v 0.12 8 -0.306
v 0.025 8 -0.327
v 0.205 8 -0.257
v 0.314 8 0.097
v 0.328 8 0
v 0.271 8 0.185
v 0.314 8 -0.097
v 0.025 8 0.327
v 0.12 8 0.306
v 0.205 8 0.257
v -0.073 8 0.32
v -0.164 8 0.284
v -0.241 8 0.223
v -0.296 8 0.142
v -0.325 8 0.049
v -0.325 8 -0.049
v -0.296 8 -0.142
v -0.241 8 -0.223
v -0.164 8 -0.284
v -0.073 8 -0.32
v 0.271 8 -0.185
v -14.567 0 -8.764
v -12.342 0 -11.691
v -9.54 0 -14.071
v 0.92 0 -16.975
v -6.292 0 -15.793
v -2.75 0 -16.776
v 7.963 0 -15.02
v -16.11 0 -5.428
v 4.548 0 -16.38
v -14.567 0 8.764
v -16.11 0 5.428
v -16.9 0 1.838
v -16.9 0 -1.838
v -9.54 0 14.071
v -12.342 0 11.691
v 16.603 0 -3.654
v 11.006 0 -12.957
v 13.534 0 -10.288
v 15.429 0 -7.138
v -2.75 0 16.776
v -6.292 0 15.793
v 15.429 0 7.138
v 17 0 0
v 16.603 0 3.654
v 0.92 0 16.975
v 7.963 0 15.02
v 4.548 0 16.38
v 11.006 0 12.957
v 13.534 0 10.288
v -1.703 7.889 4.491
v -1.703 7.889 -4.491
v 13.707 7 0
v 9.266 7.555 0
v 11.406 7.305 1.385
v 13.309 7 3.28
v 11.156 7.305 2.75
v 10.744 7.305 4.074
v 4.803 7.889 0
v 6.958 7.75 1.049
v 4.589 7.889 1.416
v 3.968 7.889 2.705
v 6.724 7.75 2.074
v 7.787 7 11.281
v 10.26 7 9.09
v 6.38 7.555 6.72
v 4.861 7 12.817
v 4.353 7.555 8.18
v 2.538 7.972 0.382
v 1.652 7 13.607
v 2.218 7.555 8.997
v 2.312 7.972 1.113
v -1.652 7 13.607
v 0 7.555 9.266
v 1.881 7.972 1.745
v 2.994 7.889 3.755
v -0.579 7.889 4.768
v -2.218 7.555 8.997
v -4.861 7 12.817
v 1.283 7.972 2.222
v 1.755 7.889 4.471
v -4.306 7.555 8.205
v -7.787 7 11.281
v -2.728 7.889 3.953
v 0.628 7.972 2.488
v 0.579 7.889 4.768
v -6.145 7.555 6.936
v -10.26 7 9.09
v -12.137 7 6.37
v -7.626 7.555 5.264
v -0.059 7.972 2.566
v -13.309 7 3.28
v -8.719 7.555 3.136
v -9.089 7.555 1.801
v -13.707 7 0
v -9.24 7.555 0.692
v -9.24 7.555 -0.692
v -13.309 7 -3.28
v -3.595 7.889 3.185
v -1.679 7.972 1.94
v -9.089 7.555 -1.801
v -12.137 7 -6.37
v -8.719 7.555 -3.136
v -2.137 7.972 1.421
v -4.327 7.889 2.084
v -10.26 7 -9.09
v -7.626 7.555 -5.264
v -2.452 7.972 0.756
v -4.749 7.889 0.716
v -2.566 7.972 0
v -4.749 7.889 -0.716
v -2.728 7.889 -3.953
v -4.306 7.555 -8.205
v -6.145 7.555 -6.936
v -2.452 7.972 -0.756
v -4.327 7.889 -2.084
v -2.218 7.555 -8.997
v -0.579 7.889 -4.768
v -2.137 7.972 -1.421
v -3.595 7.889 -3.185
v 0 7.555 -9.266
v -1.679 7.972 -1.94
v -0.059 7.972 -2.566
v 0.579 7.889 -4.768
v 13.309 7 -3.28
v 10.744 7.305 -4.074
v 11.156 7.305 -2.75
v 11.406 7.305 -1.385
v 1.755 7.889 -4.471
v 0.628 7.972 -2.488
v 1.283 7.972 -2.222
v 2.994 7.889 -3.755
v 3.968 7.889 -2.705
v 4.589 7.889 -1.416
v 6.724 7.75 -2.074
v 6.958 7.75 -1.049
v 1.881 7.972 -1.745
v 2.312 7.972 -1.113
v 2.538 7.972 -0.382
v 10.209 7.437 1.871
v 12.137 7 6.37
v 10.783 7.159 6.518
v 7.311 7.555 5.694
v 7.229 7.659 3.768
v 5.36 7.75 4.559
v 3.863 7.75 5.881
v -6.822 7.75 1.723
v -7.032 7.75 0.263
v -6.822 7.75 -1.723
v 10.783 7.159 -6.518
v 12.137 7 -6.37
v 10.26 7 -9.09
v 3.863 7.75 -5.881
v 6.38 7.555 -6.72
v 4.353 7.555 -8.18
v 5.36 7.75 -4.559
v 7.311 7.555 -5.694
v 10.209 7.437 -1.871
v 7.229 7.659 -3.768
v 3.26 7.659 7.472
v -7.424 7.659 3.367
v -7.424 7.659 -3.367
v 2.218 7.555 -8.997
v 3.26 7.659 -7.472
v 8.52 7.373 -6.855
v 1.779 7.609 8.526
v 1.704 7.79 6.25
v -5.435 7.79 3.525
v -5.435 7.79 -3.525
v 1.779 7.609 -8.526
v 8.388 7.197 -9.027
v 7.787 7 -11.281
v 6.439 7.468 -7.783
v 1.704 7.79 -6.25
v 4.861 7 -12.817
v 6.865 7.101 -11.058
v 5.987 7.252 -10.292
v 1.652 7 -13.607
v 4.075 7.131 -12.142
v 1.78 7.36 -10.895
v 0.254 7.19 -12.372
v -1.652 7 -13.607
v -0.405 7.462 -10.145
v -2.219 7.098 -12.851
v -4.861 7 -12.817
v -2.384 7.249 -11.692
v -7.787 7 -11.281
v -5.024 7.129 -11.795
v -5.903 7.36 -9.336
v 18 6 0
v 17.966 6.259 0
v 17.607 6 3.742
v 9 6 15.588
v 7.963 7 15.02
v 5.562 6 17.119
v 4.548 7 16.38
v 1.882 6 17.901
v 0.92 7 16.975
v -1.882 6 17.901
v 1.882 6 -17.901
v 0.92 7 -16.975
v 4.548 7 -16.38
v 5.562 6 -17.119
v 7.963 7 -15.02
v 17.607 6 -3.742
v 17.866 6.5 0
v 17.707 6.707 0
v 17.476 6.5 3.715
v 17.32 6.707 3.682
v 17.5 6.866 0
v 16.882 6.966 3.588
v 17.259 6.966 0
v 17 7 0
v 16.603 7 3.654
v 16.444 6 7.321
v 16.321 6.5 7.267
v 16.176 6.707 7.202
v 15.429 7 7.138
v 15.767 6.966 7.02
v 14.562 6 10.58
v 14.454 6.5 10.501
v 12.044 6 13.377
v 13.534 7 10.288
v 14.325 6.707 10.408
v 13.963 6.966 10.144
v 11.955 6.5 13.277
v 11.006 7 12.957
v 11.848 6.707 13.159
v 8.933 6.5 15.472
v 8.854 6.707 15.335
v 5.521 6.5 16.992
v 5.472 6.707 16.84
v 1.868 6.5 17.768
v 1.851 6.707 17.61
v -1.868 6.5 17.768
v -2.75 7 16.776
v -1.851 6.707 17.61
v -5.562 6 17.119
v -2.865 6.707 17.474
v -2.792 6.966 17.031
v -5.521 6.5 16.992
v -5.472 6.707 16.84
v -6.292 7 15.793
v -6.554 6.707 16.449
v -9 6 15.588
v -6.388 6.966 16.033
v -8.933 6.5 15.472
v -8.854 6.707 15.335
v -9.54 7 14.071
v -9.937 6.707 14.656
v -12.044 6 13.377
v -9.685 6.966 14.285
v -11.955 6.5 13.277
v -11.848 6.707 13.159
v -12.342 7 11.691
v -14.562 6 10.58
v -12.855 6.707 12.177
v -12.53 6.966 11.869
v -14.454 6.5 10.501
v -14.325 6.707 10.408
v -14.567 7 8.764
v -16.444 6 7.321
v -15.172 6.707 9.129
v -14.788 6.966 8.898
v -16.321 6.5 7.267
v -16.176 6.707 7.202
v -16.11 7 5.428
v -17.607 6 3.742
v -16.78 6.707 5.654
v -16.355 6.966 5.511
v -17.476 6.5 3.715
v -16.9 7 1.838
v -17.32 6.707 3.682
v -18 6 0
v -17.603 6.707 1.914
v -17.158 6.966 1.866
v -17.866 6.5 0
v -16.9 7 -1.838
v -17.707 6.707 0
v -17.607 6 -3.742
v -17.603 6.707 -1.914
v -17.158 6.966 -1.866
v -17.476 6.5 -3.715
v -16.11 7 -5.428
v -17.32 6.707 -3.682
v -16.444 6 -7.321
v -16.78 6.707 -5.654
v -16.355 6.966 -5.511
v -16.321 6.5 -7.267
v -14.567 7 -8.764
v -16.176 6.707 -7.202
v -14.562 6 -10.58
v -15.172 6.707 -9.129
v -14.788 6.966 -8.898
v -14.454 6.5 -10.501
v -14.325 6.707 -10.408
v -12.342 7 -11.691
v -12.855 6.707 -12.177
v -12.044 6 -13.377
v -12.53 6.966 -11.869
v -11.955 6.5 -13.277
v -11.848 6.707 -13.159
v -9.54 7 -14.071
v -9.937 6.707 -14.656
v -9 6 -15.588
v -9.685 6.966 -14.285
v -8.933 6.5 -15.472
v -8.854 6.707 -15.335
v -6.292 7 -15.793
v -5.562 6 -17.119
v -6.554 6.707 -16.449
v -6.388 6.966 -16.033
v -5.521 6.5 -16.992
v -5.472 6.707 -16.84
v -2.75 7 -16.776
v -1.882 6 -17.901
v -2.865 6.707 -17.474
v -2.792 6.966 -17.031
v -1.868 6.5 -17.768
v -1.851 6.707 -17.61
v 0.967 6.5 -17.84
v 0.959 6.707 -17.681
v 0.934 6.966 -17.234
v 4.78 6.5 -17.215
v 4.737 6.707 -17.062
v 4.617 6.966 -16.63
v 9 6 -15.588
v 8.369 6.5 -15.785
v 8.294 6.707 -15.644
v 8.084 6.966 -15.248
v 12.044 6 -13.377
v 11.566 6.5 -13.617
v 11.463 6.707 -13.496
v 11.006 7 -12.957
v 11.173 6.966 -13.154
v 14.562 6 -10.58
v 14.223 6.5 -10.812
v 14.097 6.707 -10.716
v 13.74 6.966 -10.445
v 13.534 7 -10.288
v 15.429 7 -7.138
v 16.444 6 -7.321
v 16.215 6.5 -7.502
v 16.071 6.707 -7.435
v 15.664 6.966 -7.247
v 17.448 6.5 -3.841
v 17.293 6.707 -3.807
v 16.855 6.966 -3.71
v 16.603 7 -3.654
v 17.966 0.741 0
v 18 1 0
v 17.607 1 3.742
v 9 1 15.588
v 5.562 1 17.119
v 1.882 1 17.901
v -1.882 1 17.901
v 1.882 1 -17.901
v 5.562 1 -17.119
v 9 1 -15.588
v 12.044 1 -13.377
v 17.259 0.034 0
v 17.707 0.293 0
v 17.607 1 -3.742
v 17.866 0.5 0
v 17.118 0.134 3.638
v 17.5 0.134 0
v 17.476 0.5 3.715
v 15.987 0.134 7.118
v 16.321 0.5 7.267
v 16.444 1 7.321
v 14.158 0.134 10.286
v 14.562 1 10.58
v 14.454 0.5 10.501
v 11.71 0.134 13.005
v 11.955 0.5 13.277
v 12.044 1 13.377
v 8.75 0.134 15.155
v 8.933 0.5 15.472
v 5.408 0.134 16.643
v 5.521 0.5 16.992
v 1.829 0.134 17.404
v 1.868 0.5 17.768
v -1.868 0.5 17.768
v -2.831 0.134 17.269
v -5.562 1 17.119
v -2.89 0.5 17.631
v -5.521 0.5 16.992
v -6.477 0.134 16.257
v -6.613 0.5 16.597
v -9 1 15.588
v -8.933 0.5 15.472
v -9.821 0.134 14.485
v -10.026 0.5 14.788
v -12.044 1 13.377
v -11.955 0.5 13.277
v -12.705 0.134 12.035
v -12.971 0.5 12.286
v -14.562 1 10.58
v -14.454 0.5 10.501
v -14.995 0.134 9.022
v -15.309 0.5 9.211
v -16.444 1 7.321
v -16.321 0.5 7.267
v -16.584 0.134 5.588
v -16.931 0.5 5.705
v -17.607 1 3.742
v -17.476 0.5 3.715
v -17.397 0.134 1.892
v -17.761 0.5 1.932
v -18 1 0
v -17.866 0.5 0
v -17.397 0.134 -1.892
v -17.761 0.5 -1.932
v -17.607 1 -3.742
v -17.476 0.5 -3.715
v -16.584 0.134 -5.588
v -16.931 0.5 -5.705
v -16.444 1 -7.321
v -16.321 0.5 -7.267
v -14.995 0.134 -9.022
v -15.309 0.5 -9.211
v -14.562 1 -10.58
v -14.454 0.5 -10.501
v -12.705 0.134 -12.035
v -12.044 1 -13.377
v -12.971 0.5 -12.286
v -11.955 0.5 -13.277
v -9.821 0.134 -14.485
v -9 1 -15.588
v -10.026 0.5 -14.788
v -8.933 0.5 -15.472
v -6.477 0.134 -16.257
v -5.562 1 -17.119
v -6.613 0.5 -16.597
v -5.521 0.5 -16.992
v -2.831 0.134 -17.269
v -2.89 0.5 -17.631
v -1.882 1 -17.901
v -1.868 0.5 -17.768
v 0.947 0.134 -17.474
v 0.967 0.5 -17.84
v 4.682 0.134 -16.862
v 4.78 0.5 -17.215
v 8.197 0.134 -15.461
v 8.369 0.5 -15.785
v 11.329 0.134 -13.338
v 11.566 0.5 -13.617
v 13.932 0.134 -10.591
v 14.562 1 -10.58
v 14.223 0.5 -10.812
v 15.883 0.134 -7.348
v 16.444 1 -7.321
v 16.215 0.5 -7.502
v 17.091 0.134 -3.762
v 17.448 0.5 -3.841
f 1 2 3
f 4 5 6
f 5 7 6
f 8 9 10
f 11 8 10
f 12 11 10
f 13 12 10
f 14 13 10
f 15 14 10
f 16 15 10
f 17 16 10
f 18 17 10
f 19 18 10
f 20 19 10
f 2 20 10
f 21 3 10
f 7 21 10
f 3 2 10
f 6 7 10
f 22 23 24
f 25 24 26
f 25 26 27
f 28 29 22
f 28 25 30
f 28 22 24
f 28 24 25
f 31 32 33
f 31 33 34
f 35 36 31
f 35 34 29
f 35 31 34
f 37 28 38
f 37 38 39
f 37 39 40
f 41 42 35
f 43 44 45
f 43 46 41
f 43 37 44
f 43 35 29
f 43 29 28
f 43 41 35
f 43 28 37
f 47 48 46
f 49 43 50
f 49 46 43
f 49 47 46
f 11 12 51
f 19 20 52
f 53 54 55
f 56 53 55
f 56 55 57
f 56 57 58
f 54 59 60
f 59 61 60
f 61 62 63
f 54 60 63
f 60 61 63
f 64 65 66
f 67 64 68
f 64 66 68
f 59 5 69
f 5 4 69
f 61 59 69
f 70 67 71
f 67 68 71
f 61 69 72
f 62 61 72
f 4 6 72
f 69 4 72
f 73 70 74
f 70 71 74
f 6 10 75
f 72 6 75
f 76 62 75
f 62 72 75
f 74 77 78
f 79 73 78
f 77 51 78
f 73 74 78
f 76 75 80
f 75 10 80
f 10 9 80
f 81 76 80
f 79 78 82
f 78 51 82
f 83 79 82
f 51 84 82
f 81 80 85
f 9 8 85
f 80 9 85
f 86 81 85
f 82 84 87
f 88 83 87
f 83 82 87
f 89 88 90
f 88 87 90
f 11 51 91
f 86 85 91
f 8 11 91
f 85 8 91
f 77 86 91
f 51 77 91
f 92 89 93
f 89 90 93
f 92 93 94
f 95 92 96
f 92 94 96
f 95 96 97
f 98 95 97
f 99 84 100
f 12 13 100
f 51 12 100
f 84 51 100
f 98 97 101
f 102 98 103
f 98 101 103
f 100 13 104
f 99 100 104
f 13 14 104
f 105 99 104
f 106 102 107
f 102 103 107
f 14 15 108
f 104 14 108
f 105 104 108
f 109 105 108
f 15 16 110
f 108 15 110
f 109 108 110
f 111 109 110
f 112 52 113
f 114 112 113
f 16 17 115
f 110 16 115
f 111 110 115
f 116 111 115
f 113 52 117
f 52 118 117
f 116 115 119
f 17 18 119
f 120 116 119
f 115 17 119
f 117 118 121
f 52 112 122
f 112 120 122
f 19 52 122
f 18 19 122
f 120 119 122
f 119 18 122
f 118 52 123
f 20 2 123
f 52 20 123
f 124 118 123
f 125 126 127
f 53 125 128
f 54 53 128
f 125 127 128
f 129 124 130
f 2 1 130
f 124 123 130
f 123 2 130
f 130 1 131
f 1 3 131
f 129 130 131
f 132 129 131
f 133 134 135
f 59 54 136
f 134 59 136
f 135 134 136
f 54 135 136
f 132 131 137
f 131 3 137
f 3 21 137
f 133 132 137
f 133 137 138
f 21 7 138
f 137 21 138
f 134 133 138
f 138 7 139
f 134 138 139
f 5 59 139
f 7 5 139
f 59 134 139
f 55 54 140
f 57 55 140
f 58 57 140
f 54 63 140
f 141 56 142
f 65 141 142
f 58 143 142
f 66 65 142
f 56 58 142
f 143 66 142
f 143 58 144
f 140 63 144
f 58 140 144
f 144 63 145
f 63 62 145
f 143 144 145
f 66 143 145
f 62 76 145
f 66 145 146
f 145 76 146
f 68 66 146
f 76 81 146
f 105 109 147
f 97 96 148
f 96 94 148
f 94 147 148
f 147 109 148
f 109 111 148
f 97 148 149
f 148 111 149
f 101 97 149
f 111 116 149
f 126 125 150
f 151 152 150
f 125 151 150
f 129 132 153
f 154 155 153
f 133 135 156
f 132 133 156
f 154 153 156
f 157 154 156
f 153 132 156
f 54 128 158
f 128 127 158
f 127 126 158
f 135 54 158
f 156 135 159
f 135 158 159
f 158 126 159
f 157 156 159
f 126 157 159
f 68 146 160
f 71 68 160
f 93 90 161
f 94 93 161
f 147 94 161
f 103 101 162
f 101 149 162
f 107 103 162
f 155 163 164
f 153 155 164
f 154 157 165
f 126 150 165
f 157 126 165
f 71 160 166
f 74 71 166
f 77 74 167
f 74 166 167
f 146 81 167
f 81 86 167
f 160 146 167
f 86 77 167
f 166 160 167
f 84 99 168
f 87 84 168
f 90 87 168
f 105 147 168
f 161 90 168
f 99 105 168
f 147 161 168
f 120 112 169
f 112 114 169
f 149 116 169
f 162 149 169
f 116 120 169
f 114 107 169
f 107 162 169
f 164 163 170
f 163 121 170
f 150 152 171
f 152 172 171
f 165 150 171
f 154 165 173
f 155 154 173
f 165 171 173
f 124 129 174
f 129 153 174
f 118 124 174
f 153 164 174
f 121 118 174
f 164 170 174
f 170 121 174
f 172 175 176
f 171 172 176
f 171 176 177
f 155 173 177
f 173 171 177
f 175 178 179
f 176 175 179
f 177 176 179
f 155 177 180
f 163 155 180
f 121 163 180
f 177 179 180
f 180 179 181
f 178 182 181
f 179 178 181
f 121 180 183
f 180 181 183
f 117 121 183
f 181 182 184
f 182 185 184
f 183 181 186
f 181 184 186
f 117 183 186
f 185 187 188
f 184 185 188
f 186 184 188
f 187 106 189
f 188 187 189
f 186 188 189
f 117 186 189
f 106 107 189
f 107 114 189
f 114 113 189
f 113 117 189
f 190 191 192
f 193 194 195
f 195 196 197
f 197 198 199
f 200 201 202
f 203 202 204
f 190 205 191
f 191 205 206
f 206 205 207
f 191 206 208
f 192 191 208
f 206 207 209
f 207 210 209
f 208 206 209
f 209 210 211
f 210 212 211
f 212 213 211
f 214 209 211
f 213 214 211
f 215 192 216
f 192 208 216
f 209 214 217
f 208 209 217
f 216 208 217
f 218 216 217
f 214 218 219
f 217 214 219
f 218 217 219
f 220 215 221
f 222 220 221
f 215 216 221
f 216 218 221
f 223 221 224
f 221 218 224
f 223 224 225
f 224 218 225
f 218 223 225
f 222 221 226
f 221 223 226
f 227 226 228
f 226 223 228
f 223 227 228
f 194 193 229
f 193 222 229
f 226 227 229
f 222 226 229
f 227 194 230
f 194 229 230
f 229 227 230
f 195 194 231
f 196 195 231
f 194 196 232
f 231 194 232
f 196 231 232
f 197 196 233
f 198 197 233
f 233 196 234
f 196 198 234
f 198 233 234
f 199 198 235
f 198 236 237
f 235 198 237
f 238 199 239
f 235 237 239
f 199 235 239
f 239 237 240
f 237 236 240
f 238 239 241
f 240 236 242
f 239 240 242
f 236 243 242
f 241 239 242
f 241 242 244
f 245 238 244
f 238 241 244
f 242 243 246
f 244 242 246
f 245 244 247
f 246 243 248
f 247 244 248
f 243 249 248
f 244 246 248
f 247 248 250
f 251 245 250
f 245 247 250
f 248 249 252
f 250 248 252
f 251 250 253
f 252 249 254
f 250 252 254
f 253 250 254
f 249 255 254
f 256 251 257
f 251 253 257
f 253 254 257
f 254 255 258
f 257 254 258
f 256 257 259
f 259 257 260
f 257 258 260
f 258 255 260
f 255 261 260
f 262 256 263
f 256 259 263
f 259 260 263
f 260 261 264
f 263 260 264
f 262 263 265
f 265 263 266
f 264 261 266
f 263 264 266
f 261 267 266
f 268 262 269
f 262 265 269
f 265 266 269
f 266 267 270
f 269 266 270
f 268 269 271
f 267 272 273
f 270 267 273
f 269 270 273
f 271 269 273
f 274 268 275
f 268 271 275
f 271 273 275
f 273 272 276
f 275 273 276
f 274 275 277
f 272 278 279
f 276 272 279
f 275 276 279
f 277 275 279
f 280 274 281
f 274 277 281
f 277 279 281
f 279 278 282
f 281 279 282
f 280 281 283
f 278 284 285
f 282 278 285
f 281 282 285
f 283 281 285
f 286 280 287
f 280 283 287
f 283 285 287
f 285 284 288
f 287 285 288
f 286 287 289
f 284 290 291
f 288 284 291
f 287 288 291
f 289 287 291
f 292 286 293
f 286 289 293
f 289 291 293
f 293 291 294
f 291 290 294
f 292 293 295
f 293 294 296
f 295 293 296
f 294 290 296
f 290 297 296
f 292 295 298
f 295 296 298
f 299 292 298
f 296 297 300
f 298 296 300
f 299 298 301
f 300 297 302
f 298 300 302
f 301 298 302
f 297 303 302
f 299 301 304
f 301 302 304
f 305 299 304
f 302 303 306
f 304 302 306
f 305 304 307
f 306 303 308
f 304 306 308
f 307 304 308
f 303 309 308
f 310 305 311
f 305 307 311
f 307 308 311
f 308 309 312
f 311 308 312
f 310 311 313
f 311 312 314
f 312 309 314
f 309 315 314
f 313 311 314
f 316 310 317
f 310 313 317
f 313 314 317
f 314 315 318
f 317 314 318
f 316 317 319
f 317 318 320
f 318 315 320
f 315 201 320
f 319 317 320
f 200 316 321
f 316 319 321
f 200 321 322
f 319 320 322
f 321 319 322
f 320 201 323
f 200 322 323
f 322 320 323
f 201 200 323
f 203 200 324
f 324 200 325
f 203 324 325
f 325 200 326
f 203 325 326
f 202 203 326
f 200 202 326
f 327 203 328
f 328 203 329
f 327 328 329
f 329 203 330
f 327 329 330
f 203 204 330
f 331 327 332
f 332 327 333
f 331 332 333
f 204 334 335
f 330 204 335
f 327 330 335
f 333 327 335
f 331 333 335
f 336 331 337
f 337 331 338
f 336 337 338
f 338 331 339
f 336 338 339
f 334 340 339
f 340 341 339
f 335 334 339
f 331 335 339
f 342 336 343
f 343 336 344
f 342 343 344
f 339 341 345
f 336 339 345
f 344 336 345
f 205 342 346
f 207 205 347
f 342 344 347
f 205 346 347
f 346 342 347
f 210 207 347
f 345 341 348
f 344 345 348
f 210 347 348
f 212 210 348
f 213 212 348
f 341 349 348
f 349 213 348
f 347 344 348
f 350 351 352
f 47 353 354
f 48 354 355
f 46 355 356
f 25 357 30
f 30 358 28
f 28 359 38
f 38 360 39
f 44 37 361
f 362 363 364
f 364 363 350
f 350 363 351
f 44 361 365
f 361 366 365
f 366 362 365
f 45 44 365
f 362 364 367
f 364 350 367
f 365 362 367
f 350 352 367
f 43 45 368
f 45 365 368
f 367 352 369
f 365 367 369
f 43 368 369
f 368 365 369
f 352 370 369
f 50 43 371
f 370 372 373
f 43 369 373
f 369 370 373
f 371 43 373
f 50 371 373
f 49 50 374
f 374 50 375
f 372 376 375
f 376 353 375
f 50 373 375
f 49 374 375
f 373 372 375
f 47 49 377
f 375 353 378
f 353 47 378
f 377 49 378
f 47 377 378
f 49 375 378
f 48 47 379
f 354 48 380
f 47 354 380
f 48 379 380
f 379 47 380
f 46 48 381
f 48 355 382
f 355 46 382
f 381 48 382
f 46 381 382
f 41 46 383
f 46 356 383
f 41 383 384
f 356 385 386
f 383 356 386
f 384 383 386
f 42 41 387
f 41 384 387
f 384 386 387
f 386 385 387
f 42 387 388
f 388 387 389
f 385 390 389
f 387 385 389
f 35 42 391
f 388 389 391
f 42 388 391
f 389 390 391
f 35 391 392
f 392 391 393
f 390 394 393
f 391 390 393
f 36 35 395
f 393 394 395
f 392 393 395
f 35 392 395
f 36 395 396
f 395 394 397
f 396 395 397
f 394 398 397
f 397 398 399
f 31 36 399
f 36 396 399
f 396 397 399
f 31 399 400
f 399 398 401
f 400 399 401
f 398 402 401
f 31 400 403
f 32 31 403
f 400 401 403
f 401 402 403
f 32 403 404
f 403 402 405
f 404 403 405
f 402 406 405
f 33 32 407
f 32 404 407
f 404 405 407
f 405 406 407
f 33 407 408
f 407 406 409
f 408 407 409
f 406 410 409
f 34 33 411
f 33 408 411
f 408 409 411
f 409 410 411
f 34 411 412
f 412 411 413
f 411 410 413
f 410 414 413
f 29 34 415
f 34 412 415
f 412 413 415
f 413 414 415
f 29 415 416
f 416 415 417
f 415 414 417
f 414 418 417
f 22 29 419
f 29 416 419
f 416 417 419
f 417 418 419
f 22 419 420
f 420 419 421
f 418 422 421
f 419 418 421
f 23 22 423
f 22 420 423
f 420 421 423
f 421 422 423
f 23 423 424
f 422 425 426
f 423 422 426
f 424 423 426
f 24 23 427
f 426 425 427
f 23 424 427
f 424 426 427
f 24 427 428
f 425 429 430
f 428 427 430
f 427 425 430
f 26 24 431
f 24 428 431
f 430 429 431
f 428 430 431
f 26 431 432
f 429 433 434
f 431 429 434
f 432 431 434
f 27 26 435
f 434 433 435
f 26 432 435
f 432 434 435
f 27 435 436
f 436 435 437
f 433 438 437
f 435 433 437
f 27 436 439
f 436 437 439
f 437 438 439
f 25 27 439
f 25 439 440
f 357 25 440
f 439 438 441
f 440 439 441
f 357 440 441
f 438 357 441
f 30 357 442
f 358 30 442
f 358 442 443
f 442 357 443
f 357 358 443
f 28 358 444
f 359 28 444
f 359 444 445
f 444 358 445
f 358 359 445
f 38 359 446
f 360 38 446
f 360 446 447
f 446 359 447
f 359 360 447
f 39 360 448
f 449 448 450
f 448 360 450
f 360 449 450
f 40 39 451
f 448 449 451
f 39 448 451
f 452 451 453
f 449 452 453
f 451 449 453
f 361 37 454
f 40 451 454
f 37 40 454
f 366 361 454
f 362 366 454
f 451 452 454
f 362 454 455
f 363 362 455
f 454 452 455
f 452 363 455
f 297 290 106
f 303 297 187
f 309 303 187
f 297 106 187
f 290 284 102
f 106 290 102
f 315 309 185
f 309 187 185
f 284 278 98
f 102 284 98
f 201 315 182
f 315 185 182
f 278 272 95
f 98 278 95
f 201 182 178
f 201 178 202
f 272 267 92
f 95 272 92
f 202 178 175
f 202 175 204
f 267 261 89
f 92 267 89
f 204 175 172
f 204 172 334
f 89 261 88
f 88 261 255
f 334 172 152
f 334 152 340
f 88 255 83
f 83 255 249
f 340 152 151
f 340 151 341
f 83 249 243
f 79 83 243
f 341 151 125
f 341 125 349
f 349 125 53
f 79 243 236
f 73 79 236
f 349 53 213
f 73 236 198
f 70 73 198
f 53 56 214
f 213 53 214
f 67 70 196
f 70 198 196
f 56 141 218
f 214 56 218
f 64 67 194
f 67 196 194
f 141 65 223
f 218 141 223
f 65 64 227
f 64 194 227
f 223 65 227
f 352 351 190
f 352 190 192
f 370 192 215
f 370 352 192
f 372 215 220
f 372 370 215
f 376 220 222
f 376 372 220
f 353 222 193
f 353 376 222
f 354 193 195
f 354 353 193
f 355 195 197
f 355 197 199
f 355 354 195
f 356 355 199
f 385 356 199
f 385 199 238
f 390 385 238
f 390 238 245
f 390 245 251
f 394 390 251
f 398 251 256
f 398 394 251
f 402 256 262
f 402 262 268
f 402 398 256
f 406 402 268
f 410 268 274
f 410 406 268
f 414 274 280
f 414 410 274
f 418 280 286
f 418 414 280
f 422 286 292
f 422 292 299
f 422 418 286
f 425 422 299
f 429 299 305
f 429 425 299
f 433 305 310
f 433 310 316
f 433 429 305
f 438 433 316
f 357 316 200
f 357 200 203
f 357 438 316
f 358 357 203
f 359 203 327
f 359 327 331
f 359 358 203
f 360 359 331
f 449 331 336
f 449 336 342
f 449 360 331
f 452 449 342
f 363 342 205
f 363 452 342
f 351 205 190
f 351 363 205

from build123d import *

# Parameters (mm, degrees)
F0_R     = 18
F0_R_2   = 13.6738896343
F2_DEPTH = 7
F1_R     = 13.7073607276
F3_DEPTH = 8
F4_R     = 1


# Not quite as in the source:
# - a fillet or chamfer that OpenCascade refuses, or shapes differently, is made with other operations: its cross-section is extruded or revolved along the edge and cut away or added


with BuildPart() as f2:
    # F0 (on Front) → F2 (new body)
    with BuildSketch(Plane.XZ):
        Circle(F0_R)
        Circle(F0_R_2, mode=Mode.SUBTRACT)
    extrude(amount=-F2_DEPTH)

    # F1 (on Front) → F3 (join)
    with BuildSketch(Plane.XZ):
        Circle(F1_R)
    extrude(amount=-F3_DEPTH)

    # F4
    f4_edges = [f2.edges().sort_by_distance(p)[0] for p in [
        (18, 3.5, 0),
        (-18, 0, 0),
        (-18, 7, 0),
    ]]
    fillet(f4_edges, radius=F4_R)

    # F5: fillet of radius 90 on 1 edges, made by hand

    # F5_s1 → F5_t2 (revolve, cut)
    with BuildSketch(Plane.XY):
        with BuildLine():
            ThreePointArc((13.7073607276, 7), (7.0364764999, 7.7496518099), (0.3282725674, 8))
            Line((0.3282725674, 8), (13.7073607276, 8))
            Line((13.7073607276, 8), (13.7073607276, 7))
        make_face()
    revolve(axis=Axis((0, 8, 0), (0, -1, 0)), mode=Mode.SUBTRACT)


solid = f2.part
